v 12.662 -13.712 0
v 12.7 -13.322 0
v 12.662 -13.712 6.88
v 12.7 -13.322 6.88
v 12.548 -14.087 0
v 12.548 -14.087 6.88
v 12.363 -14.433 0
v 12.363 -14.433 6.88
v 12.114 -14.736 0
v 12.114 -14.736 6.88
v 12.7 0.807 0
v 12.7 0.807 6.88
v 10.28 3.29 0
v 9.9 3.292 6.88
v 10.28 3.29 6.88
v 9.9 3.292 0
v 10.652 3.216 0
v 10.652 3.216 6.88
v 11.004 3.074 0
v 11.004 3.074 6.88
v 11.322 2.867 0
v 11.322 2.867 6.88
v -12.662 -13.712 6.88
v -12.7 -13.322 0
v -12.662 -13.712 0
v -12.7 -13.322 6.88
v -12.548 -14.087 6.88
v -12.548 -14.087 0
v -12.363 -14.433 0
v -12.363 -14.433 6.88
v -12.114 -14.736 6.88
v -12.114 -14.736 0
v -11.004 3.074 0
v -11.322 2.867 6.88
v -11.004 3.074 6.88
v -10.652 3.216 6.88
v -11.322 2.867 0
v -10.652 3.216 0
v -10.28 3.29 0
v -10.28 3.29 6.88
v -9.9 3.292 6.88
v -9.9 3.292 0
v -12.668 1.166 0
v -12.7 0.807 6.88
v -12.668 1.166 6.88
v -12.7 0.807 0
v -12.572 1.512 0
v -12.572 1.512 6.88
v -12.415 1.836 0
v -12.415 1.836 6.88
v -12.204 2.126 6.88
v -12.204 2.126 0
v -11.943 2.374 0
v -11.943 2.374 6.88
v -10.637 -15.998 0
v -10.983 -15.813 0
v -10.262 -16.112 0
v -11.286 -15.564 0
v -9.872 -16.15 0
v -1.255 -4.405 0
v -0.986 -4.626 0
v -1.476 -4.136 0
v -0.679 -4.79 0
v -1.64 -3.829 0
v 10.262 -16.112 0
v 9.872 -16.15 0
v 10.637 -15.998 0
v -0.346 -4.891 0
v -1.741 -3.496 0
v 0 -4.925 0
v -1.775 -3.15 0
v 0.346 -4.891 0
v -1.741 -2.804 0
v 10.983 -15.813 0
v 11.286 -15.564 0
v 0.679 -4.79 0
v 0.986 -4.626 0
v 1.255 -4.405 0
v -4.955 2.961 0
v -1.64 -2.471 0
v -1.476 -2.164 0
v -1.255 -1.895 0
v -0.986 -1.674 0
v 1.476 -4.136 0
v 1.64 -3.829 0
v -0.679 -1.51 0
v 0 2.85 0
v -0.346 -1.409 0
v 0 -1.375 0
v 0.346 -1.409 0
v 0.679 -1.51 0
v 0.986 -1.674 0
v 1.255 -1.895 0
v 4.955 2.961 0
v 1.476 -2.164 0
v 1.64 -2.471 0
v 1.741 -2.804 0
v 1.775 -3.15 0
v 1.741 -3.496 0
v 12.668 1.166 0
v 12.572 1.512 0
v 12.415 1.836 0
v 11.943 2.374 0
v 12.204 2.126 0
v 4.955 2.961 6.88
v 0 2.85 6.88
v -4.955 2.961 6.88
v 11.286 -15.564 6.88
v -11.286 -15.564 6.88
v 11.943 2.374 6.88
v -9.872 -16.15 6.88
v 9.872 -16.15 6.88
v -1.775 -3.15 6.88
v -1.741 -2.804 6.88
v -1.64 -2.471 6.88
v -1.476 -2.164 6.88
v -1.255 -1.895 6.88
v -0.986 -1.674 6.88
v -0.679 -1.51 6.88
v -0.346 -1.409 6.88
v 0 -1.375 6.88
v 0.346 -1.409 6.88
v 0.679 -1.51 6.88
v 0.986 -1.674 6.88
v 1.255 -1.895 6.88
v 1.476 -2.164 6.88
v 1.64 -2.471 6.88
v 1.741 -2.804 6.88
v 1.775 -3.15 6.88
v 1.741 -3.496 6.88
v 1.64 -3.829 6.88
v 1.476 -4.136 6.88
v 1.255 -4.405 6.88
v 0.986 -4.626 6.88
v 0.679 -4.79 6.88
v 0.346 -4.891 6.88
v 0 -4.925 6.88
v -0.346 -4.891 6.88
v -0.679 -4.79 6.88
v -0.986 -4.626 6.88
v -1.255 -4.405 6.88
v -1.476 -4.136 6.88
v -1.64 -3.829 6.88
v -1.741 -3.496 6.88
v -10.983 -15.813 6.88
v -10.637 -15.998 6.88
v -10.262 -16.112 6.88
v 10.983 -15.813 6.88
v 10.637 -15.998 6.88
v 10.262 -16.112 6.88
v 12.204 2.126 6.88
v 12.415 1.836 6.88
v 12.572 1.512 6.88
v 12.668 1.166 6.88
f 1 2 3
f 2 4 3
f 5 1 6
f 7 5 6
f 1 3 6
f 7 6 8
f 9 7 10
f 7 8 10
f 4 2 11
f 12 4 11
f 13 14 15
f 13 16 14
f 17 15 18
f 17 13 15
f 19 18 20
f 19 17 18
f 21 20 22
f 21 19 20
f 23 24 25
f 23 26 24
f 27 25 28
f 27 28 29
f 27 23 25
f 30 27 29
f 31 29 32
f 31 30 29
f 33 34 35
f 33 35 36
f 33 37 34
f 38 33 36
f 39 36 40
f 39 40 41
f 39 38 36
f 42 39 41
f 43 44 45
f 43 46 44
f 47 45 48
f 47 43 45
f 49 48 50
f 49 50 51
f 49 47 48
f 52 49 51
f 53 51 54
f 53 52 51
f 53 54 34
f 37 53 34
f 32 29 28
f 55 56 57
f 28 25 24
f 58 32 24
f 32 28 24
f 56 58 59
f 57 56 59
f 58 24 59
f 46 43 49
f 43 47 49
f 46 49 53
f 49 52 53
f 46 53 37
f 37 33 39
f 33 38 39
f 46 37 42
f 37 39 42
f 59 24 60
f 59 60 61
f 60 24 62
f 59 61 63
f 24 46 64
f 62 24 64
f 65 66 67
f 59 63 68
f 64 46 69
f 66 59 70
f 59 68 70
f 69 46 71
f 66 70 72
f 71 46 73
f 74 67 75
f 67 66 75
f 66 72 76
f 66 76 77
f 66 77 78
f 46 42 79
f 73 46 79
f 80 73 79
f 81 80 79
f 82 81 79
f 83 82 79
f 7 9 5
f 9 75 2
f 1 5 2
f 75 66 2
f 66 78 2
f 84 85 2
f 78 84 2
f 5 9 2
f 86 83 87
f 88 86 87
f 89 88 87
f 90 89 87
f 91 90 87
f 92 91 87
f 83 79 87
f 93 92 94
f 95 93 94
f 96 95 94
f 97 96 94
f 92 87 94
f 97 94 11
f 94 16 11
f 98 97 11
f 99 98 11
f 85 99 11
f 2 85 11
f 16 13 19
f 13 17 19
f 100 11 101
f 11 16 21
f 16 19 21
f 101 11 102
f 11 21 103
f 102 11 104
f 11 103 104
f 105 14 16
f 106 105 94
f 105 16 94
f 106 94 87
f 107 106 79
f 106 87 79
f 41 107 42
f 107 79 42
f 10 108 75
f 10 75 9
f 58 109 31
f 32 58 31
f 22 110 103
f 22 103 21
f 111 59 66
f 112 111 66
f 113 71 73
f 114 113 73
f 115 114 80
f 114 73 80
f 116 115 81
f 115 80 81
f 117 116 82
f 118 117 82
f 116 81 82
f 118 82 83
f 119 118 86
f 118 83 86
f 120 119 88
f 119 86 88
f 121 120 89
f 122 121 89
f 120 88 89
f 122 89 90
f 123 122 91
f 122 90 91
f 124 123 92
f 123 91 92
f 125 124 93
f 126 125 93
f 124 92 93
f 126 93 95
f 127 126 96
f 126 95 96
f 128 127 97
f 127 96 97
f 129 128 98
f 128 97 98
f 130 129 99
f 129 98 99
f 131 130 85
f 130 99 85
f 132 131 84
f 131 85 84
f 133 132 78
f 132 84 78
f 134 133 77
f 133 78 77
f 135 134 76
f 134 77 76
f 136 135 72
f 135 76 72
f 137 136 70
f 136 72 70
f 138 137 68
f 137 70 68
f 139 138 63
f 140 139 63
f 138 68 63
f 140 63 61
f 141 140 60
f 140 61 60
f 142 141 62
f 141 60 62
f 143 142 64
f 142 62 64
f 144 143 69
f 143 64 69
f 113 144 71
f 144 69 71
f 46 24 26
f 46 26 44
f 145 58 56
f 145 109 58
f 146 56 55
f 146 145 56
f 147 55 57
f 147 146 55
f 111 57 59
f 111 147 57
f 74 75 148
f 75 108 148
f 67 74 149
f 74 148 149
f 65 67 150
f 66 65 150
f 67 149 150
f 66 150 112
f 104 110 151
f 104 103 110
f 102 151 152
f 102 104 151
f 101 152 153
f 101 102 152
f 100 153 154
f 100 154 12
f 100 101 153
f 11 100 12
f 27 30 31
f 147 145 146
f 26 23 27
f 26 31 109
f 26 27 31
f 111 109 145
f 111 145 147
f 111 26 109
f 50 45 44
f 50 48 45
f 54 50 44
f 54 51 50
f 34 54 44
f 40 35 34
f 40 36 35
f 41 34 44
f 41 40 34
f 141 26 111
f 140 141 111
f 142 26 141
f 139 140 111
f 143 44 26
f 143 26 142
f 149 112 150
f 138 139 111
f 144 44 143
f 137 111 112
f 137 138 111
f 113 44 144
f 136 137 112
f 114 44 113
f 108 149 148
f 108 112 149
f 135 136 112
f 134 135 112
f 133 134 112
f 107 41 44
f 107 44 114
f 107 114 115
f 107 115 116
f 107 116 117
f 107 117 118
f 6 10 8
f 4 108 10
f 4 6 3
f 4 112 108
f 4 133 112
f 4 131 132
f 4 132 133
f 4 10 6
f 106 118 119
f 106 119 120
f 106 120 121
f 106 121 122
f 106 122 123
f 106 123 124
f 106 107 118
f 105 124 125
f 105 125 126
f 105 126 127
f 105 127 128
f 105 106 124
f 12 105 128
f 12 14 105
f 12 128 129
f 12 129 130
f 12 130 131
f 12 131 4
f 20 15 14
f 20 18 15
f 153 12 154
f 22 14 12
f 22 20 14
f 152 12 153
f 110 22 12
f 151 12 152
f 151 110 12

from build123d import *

# Parameters (mm, degrees)
SKETCH1_W           = 25.4
SKETCH1_H           = 32.3
BOSS_EXTRUDE1_DEPTH = 6.88
SKETCH3_R           = 111
SKETCH3_R_2         = 1.775
CUT_EXTRUDE1_DEPTH  = 6.88
CHAMFER1_SIZE       = 1.805302587
CHAMFER1_SIZE_2     = 2
FILLET1_R           = 2


with BuildPart() as part:
    # Sketch1 → Boss-Extrude1 (new body)
    with BuildSketch(Plane.XY):
        Rectangle(SKETCH1_W, SKETCH1_H)
    extrude(amount=BOSS_EXTRUDE1_DEPTH)

    # Sketch3 → Cut-Extrude1 (cut)
    with BuildSketch(Plane(origin=(0, 0, 0), x_dir=(-1, 0, 0), z_dir=(0, 0, -1))):
        with Locations((0, 113.850000001)):
            Circle(SKETCH3_R)
        with Locations((0, -3.149999999)):
            Circle(SKETCH3_R_2)
    extrude(amount=-CUT_EXTRUDE1_DEPTH, mode=Mode.SUBTRACT)

    # Chamfer1
    # the kernel refuses this chamfer: 2, 1.805302587 mm, written as the material it takes off along each edge
    with BuildSketch(Plane(origin=(-12.7, 3.578924918, 12.070681021), x_dir=(0, -1, 0), z_dir=(0, 0, -1))) as chamfer1_piece_1:
        with BuildLine():
            Line((CHAMFER1_SIZE, 0), (0.212697329, -2.007197118))
            ThreePointArc((0.212697329, -2.007197118), (0.113915873, -1.031505174), (0, 0))
            Line((0, 0), (CHAMFER1_SIZE, 0))
        make_face()
    extrude(amount=17.261362042, mode=Mode.SUBTRACT)
    with BuildSketch(Plane(origin=(12.7, 3.578924918, 12.070681021), x_dir=(0, -1, 0), z_dir=(0, 0, -1))) as chamfer1_piece_2:
        with BuildLine():
            Line((CHAMFER1_SIZE, 0), (0.212697329, 2.007197118))
            ThreePointArc((0.212697329, 2.007197118), (0.113915873, 1.031505174), (0, 0))
            Line((0, 0), (CHAMFER1_SIZE, 0))
        make_face()
    extrude(amount=17.261362042, mode=Mode.SUBTRACT)
    with BuildSketch(Plane(origin=(12.7, -16.15, -5.143365976), x_dir=(-1, 0, 0), z_dir=(0, 0, 1))) as chamfer1_piece_3:
        Polygon((CHAMFER1_SIZE_2, 0), (0, -CHAMFER1_SIZE_2), (0, 0), align=None)
    extrude(amount=17.166731952, mode=Mode.SUBTRACT)
    with BuildSketch(Plane(origin=(-12.7, -16.15, -5.143365976), x_dir=(1, 0, 0), z_dir=(0, 0, 1))) as chamfer1_piece_4:
        Polygon((CHAMFER1_SIZE_2, 0), (0, CHAMFER1_SIZE_2), (0, 0), align=None)
    extrude(amount=17.166731952, mode=Mode.SUBTRACT)

    # Fillet1
    fillet1_edges = [part.edges().sort_by_distance(p)[0] for p in [
        (12.7, -14.15, 3.44),
        (12.7, 1.773622331, 3.44),
        (-10.692802882, 3.366227588, 3.44),
        (10.692802882, 3.366227588, 3.44),
        (-10.7, -16.15, 3.44),
        (10.7, -16.15, 3.44),
        (-12.7, -14.15, 3.44),
        (-12.7, 1.773622331, 3.44),
    ]]
    fillet(fillet1_edges, radius=FILLET1_R)


solid = part.part
